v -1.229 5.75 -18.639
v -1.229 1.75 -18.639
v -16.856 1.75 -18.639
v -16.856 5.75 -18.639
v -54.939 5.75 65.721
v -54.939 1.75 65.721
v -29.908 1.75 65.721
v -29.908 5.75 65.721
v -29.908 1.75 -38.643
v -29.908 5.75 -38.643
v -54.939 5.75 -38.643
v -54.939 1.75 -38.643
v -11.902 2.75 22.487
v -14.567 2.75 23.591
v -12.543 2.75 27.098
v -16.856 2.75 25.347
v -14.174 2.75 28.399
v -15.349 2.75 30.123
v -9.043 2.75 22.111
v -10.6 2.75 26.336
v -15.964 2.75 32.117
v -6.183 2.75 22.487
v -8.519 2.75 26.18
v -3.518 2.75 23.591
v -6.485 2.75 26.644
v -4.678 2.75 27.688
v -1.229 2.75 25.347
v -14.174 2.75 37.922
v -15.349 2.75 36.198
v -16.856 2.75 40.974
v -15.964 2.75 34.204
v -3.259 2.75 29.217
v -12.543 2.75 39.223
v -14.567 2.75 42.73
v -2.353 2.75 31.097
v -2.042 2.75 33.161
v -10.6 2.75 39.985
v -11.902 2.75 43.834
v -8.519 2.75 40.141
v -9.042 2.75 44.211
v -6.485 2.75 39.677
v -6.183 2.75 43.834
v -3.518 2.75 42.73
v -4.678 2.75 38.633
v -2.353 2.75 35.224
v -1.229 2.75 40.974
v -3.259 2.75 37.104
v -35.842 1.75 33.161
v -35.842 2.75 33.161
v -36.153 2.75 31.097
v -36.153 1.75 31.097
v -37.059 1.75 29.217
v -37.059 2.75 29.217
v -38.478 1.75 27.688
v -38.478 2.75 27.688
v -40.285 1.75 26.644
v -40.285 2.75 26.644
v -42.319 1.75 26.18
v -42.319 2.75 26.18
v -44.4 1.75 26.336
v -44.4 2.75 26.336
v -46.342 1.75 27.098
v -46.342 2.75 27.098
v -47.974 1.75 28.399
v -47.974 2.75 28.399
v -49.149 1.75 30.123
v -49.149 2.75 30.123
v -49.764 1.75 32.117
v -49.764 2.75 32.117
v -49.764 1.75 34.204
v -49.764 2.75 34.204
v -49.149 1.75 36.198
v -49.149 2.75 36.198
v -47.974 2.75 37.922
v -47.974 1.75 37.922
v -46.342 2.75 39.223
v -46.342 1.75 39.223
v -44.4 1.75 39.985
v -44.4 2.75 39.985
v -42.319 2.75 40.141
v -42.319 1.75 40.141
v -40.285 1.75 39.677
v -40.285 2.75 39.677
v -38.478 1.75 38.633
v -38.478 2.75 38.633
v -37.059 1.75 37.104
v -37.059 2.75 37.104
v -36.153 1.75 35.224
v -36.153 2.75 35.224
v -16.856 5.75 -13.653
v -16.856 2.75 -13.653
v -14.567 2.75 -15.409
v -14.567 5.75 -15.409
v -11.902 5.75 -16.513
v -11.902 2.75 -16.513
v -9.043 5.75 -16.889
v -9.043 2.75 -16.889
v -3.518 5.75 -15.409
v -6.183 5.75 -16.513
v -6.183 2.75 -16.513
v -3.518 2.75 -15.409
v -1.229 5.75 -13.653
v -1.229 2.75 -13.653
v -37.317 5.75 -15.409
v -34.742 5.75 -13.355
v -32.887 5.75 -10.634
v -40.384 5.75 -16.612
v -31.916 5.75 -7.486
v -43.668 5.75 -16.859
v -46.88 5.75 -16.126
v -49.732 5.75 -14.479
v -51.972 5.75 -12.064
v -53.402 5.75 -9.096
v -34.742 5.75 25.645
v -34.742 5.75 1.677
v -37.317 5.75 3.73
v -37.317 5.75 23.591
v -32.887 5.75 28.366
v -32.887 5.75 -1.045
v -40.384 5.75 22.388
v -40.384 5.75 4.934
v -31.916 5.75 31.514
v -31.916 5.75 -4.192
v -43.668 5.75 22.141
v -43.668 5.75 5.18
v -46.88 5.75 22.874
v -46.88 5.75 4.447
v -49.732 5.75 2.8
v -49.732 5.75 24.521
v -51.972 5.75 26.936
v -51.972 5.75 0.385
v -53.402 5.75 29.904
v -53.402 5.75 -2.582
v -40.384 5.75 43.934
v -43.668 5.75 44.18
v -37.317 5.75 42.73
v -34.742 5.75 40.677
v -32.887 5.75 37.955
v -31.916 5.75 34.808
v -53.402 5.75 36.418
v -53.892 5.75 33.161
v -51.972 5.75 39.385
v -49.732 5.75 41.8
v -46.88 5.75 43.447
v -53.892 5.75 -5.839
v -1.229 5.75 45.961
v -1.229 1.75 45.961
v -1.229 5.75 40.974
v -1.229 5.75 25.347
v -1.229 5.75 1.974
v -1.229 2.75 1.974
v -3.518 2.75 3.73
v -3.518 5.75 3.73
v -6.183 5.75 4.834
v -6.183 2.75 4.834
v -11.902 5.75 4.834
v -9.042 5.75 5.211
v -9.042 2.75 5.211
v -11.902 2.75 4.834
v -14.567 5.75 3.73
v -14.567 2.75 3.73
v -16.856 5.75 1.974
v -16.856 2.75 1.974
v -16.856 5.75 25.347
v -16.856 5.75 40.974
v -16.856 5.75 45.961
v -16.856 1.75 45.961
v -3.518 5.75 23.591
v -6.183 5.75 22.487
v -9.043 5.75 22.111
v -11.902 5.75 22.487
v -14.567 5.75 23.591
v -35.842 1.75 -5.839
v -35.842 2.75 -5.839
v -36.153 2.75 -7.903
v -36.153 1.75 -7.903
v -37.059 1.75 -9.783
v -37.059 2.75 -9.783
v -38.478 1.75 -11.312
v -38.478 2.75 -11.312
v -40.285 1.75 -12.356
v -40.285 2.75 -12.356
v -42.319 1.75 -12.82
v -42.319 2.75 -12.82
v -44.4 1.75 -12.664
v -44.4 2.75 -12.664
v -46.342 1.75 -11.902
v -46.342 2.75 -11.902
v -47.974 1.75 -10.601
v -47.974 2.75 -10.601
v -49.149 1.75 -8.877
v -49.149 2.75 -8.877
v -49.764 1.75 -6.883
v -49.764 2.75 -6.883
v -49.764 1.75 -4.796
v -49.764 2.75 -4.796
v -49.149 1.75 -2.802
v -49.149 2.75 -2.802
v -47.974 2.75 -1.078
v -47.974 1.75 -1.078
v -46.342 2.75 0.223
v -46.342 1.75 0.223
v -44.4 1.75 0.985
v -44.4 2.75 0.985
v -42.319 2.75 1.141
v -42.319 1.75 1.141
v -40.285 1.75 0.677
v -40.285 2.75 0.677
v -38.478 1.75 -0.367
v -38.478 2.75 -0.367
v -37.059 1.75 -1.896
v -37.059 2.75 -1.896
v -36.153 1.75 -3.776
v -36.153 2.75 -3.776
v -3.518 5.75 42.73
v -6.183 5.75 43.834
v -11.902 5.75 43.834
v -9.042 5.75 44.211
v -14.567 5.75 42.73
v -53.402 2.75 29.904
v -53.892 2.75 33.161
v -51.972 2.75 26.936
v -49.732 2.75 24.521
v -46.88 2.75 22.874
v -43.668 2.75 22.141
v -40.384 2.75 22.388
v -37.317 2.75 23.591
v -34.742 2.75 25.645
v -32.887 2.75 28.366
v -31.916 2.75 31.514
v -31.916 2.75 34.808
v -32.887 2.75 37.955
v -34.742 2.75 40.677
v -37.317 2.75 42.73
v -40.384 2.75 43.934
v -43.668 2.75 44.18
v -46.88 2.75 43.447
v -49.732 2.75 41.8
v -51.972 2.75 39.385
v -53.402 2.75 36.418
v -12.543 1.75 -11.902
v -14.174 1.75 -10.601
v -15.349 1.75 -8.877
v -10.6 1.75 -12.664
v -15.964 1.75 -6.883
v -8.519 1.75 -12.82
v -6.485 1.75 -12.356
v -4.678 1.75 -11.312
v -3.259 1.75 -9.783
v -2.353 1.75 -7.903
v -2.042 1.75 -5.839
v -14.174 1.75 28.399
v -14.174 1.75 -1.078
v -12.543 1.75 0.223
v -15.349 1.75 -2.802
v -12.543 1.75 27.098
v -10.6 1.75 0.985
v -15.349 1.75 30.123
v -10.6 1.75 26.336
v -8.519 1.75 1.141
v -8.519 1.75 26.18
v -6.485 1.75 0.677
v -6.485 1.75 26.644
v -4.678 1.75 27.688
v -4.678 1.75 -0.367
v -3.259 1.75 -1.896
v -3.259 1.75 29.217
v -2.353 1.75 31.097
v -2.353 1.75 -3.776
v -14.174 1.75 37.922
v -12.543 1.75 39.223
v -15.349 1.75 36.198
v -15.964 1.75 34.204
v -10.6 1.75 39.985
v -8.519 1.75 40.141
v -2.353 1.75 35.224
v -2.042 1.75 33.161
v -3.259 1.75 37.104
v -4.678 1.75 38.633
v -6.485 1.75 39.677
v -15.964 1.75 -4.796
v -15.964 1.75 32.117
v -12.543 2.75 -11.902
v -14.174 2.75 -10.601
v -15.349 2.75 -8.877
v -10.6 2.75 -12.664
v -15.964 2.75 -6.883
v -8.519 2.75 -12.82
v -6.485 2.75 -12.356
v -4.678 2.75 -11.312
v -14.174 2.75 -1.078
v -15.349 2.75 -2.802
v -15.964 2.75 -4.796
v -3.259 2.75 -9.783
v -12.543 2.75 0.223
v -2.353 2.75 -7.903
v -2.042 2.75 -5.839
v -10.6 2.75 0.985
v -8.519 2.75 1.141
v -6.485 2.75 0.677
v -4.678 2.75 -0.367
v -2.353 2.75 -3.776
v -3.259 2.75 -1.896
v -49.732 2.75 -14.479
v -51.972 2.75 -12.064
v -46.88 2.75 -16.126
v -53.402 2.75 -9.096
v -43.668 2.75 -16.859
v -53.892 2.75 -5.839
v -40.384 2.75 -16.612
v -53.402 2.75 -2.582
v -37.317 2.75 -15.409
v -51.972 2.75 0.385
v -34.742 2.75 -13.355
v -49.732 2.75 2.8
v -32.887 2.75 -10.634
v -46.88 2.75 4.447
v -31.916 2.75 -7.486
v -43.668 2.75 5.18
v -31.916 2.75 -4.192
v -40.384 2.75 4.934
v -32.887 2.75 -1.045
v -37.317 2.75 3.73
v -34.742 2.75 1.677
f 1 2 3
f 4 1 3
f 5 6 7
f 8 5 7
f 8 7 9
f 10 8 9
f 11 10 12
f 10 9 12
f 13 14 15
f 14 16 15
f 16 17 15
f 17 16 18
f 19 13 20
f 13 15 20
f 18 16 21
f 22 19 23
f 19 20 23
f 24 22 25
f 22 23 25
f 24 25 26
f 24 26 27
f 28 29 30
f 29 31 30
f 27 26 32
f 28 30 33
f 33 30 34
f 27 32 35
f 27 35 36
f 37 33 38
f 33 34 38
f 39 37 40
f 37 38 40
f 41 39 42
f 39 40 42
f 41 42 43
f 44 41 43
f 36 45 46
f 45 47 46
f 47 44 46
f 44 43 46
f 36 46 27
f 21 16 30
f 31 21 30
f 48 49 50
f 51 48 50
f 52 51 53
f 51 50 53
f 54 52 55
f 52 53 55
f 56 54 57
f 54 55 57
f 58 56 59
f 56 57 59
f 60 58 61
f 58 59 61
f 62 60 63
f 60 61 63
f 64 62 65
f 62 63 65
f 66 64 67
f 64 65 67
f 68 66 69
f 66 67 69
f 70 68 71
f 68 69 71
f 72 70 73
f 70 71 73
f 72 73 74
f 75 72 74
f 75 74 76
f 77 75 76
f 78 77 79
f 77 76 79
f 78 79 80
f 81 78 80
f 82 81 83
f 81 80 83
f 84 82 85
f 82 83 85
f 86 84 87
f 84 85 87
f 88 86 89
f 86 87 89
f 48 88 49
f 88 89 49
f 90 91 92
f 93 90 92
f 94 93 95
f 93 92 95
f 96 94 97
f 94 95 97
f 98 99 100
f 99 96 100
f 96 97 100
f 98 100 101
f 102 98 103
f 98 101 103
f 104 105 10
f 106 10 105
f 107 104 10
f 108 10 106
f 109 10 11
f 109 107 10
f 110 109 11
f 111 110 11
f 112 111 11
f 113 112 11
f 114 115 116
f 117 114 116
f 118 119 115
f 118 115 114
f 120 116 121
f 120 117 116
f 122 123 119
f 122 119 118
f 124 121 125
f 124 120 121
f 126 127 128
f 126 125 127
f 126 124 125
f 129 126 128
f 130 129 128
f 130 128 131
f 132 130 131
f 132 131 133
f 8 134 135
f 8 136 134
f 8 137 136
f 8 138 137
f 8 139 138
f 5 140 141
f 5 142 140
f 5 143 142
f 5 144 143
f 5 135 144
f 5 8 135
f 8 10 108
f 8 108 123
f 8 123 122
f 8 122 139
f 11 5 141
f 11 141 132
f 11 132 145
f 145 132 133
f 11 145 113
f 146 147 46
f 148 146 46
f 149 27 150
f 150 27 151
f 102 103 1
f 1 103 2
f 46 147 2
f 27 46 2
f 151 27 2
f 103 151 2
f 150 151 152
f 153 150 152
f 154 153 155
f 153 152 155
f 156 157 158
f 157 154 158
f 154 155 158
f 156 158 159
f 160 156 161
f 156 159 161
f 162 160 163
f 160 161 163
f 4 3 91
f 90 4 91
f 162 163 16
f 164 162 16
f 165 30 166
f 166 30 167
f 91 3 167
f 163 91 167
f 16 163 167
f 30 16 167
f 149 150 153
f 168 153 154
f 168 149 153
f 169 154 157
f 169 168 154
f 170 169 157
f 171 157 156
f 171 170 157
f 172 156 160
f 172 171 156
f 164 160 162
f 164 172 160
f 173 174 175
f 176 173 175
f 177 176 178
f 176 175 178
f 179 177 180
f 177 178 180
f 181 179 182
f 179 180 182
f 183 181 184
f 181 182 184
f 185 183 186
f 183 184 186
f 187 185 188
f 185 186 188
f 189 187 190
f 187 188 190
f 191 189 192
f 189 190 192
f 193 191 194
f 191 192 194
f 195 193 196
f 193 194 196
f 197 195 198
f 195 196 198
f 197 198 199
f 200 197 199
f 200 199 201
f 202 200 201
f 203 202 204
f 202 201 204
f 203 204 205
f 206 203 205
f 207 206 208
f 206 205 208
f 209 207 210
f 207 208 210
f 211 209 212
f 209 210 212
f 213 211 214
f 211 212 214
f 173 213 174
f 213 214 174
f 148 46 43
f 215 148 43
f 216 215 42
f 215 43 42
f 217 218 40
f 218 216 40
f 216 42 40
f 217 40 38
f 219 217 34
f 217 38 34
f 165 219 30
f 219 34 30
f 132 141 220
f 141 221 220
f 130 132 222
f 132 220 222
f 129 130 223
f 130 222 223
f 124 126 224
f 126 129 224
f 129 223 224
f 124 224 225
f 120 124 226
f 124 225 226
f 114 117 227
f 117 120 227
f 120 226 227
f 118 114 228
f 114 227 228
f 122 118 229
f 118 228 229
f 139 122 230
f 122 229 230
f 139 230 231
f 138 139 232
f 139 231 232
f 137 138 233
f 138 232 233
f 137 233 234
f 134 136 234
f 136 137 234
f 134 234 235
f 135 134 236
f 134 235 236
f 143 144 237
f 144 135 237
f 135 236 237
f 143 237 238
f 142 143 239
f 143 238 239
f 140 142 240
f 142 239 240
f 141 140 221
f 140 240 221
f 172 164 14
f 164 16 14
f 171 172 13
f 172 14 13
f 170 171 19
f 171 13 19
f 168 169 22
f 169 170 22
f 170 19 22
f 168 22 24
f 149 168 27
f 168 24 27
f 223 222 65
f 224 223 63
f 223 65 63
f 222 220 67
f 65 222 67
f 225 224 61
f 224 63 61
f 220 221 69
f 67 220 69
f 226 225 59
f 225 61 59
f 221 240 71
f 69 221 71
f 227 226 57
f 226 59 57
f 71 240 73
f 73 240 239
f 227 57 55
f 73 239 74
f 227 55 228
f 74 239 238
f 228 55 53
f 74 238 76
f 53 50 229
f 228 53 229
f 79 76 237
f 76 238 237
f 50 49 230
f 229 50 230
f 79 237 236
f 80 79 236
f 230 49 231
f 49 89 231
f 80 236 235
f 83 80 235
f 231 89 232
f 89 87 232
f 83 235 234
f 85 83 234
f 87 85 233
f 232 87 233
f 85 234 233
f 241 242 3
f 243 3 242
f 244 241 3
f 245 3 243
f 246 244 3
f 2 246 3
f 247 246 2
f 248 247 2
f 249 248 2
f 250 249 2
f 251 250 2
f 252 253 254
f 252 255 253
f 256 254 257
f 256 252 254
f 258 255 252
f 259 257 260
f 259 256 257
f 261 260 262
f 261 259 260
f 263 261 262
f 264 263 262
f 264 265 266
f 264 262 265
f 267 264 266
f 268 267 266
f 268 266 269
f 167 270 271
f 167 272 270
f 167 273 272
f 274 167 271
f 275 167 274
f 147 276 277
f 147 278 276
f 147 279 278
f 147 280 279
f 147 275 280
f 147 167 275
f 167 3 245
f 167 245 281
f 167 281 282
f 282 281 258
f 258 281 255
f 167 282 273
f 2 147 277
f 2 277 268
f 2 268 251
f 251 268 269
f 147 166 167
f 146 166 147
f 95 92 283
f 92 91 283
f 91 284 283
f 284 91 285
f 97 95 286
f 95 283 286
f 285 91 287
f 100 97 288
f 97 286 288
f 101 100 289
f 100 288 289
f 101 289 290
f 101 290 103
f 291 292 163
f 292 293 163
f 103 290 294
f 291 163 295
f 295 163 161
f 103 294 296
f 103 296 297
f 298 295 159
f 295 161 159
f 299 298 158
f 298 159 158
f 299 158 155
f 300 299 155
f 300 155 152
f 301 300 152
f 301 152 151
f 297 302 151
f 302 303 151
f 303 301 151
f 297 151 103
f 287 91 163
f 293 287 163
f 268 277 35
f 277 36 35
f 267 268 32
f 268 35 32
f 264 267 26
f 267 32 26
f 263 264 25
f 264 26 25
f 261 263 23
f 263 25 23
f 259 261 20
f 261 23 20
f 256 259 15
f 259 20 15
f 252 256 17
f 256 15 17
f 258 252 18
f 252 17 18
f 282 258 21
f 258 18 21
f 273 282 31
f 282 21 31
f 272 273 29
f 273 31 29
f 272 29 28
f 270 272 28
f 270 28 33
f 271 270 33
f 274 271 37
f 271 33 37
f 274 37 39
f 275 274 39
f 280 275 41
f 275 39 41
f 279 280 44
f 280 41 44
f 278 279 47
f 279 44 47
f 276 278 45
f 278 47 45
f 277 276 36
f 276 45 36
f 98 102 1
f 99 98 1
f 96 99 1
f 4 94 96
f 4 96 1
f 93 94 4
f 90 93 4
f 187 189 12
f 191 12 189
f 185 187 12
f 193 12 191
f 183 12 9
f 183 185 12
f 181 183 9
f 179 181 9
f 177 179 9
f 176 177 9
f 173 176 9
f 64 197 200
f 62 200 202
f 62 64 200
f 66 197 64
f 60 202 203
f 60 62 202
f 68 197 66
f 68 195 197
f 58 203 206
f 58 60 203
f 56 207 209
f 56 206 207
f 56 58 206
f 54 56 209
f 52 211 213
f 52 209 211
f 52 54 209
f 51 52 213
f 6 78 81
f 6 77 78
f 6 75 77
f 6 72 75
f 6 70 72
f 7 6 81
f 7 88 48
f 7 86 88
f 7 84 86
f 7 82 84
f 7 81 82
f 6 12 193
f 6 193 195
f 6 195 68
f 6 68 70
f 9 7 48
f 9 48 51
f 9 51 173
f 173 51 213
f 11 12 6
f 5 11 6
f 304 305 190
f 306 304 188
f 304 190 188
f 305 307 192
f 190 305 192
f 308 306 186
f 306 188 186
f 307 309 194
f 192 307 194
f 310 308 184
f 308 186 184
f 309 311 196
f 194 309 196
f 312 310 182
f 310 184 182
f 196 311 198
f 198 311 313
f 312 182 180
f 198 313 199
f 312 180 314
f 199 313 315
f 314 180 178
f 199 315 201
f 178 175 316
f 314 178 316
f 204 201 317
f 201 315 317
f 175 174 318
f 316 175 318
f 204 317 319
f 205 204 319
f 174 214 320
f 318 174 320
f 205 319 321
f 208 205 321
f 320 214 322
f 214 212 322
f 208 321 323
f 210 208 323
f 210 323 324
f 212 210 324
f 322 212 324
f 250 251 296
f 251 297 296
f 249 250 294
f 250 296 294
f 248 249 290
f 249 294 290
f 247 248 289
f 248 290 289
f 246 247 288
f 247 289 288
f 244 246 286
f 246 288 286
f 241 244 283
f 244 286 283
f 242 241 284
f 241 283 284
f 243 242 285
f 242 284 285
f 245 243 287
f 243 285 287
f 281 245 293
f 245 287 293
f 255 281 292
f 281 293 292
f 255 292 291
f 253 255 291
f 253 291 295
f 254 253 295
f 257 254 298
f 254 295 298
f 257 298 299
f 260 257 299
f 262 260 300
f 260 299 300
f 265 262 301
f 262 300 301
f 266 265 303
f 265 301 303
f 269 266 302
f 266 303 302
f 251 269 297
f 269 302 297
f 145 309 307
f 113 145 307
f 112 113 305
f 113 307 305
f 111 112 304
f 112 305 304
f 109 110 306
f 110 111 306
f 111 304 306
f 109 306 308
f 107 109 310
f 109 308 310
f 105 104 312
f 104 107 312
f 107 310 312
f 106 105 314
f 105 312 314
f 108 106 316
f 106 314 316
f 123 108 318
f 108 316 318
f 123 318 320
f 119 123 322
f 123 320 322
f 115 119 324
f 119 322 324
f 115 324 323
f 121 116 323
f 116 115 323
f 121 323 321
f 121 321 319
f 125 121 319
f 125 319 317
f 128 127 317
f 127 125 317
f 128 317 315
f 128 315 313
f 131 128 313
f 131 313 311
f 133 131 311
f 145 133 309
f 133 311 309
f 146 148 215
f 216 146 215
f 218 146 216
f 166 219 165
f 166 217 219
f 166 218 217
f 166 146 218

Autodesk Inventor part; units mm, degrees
ref_plane "YZ Plane" through (0, 0, 0) normal (1, 0, 0) x (0, 1, 0)
ref_plane "XZ Plane" through (0, 0, 0) normal (0, 1, 0) x (-1, 0, 0)
ref_plane "Main Work Pane" through (0, 2.75, 7) normal (0, 1, 0) x (-1, 0, 0)
sketch "Panel" plane through (0, 2.75, 7) normal (0, 1, 0) x (-1, 0, 0)
  circle A0 centre (9.0425, 26.1606) radius 11.05 construction
  circle A1 centre (9.0425, -12.8394) radius 11.05 construction
  circle A2 centre (42.8425, -12.8394) radius 11.05
  circle A3 centre (42.8425, 26.1606) radius 11.05
  line L0 (42.8425, -12.8394) -> (42.8425, -12.8394) construction
  line L1 (60.8425, 44.1606) -> (24.8425, 44.1606) construction
  line L2 (24.8425, 44.1606) -> (24.8425, 8.1606) construction
  line L3 (24.8425, 8.1606) -> (60.8425, 8.1606) construction
  line L4 (60.8425, 8.1606) -> (60.8425, 44.1606) construction
  line L5 (60.8425, 44.1606) -> (24.8425, 8.1606) construction
  line L6 (24.8425, 44.1606) -> (60.8425, 8.1606) construction
  line L7 (60.8425, 5.1606) -> (24.8425, 5.1606) construction
  line L8 (24.8425, 5.1606) -> (24.8425, -30.8394) construction
  line L9 (24.8425, -30.8394) -> (60.8425, -30.8394) construction
  line L10 (60.8425, -30.8394) -> (60.8425, 5.1606) construction
  line L11 (60.8425, 5.1606) -> (24.8425, -30.8394) construction
  line L12 (24.8425, 5.1606) -> (60.8425, -30.8394) construction
  line L13 (21.8425, 38.9606) -> (-3.7575, 38.9606) construction
  line L14 (-3.7575, 38.9606) -> (-3.7575, 13.3606) construction
  line L15 (-3.7575, 13.3606) -> (21.8425, 13.3606) construction
  line L16 (21.8425, 13.3606) -> (21.8425, 38.9606) construction
  line L17 (21.8425, 38.9606) -> (-3.7575, 13.3606) construction
  line L18 (-3.7575, 38.9606) -> (21.8425, 13.3606) construction
  line L19 (21.8425, -0.0394) -> (-3.7575, -0.0394) construction
  line L20 (-3.7575, -0.0394) -> (-3.7575, -25.6394) construction
  line L21 (-3.7575, -25.6394) -> (21.8425, -25.6394) construction
  line L22 (21.8425, -25.6394) -> (21.8425, -0.0394) construction
  line L23 (21.8425, -0.0394) -> (-3.7575, -25.6394) construction
  line L24 (-3.7575, -0.0394) -> (21.8425, -25.6394) construction
  line L25 (60.8425, -30.8394) -> (60.8425, 44.1606) construction
  line L26 (60.8425, 44.1606) -> (-3.7575, 44.1606) construction
  line L27 (-3.7575, 44.1606) -> (-3.7575, -30.8394) construction
  line L28 (-3.7575, -30.8394) -> (60.8425, -30.8394) construction
  line L29 (91.5425, -93.8394) -> (-34.4575, -93.8394) construction
  line L30 (-34.4575, -93.8394) -> (-34.4575, 107.1606) construction
  line L31 (-34.4575, 107.1606) -> (91.5425, 107.1606) construction
  line L32 (91.5425, 107.1606) -> (91.5425, -93.8394) construction
  line L33 (42.8425, 15.1106) -> (42.8425, -1.7894) construction
  line L34 (31.7925, 26.1606) -> (20.0925, 26.1606) construction
  line L35 (9.0425, 15.1106) -> (9.0425, -1.7894) construction
  line L36 (20.0925, -12.8394) -> (31.7925, -12.8394) construction
  line L37 (17.4252, 107.1606) -> (17.4252, 44.1606) construction
  line L38 (17.4252, -30.8394) -> (17.4252, -93.8394) construction
  line L39 (60.8425, 6.6606) -> (91.5425, 6.6606) construction
  line L40 (-3.7575, 6.6606) -> (-34.4575, 6.6606) construction
  line L41 (71.3425, 84.9606) -> (89.5425, 84.9606) construction
  line L42 (89.5425, 84.9606) -> (89.5425, 105.1606) construction
  line L43 (89.5425, 105.1606) -> (71.3425, 105.1606) construction
  line L44 (71.3425, 105.1606) -> (71.3425, 84.9606) construction
  line L45 (69.3425, 107.1606) -> (69.3425, 82.9606) construction
  line L46 (69.3425, 82.9606) -> (91.5425, 82.9606) construction
  line L47 (89.5425, -91.8394) -> (71.3425, -91.8394) construction
  line L48 (71.3425, -91.8394) -> (71.3425, -71.6394) construction
  line L49 (71.3425, -71.6394) -> (89.5425, -71.6394) construction
  line L50 (89.5425, -71.6394) -> (89.5425, -91.8394) construction
  line L51 (91.5425, -69.6394) -> (69.3425, -69.6394) construction
  line L52 (69.3425, -69.6394) -> (69.3425, -93.8394) construction
  line L53 (-32.4575, -91.8394) -> (-14.2575, -91.8394) construction
  line L54 (-14.2575, -91.8394) -> (-14.2575, -71.6394) construction
  line L55 (-14.2575, -71.6394) -> (-32.4575, -71.6394) construction
  line L56 (-32.4575, -71.6394) -> (-32.4575, -91.8394) construction
  line L57 (-12.2575, -93.8394) -> (-12.2575, -69.6394) construction
  line L58 (-12.2575, -69.6394) -> (-34.4575, -69.6394) construction
  line L59 (-14.2575, 84.9606) -> (-32.4575, 84.9606) construction
  line L60 (-32.4575, 84.9606) -> (-32.4575, 105.1606) construction
  line L61 (-32.4575, 105.1606) -> (-14.2575, 105.1606) construction
  line L62 (-14.2575, 105.1606) -> (-14.2575, 84.9606) construction
  line L63 (-12.2575, 107.1606) -> (-12.2575, 82.9606) construction
  line L64 (-12.2575, 82.9606) -> (-34.4575, 82.9606) construction
  circle A4 centre (80.4425, 95.0606) radius 2 construction
  line L65 (80.4425, 95.0606) -> (71.3425, 95.0606) construction
  line L66 (80.4425, 95.0606) -> (89.5425, 95.0606) construction
  line L67 (80.4425, 95.0606) -> (80.4425, 105.1606) construction
  line L68 (80.4425, 95.0606) -> (80.4425, 84.9606) construction
  circle A5 centre (-23.3575, 95.0606) radius 2 construction
  line L69 (-23.3575, 95.0606) -> (-23.3575, 84.9606) construction
  line L70 (-23.3575, 95.0606) -> (-23.3575, 105.1606) construction
  line L71 (-23.3575, 95.0606) -> (-32.4575, 95.0606) construction
  line L72 (-23.3575, 95.0606) -> (-14.2575, 95.0606) construction
  circle A6 centre (80.4425, -81.7394) radius 2 construction
  line L73 (80.4425, -81.7394) -> (80.4425, -71.6394) construction
  line L74 (80.4425, -71.6394) -> (80.4425, -81.7394) construction
  line L75 (80.4425, -91.8394) -> (80.4425, -81.7394) construction
  line L76 (80.4425, -81.7394) -> (71.3425, -81.7394) construction
  line L77 (80.4425, -81.7394) -> (89.5425, -81.7394) construction
  circle A7 centre (-23.3575, -81.7394) radius 2 construction
  line L78 (-23.3575, -81.7394) -> (-23.3575, -91.8394) construction
  line L79 (-23.3575, -81.7394) -> (-14.2575, -81.7394) construction
  line L80 (-23.3575, -81.7394) -> (-32.4575, -81.7394) construction
  line L81 (-23.3575, -81.7394) -> (-23.3575, -71.6394) construction
  line L82 (54.9391, 58.7211) -> (29.9084, 58.7211)
  line L83 (29.9084, 58.7211) -> (29.9084, -45.6432)
  line L84 (29.9084, -45.6432) -> (54.9391, -45.6432)
  line L85 (54.9391, -45.6432) -> (54.9391, 58.7211)
  arc A8 (1.229, -20.653) -> (16.856, -20.653) centre (9.0425, -12.8394) ccw
  arc A9 (16.856, -5.0259) -> (1.229, -5.0259) centre (9.0425, -12.8394) ccw
  arc A10 (1.229, 18.347) -> (16.856, 18.347) centre (9.0425, 26.1606) ccw
  arc A11 (16.856, 33.9741) -> (1.229, 33.9741) centre (9.0425, 26.1606) ccw
  line L86 (16.856, -20.653) -> (16.856, -5.0259)
  line L87 (16.856, -5.0259) -> (16.856, 18.347)
  line L88 (16.856, 18.347) -> (16.856, 33.9741)
  line L89 (1.229, 33.9741) -> (1.229, 18.347)
  line L90 (1.229, 18.347) -> (1.229, -5.0259)
  line L91 (1.229, -5.0259) -> (1.229, -20.653)
  line L92 (1.229, -20.653) -> (1.229, -25.6394)
  line L93 (1.229, -25.6394) -> (16.856, -25.6394)
  line L94 (16.856, -25.6394) -> (16.856, -20.653)
  line L95 (16.856, 33.9741) -> (16.856, 38.9606)
  line L96 (16.856, 38.9606) -> (1.229, 38.9606)
  line L97 (1.229, 38.9606) -> (1.229, 33.9741)
  dimension "d337" = 22.1
  dimension "d490" = 36
  dimension "d491" = 36
  dimension "d494" = 3
  dimension "d495" = 25.6
  dimension "d496" = 25.6
  dimension "d497" = 3
  dimension "d498" = 0
  dimension "d582" = 126
  dimension "d583" = 201
  dimension "d584" = 2
  dimension "d585" = 2
  dimension "d586" = 2
  dimension "d587" = 2
  dimension "d588" = 20.2
  dimension "d589" = 18.2
  dimension "d592" = 2
  dimension "d593" = 4
  dimension "d597" = 2
  dimension "d648" = 2
  dimension "d651" = 152.6
ref_plane "Work Plane13" through (0, 2.75, 7) normal (0, -1, 0) x (1, 0, 0)
ref_plane "Work Plane11" through (0, 2.75, 7) normal (0, -1, 0) x (1, 0, 0)
ref_plane "Work Plane12" through (0, 4.75, 7) normal (0, 1, 0) x (1, 0, 0)
extrude "FlatPlane" add sketch "Panel" along normal blind 3 contours L85 L84 L83 L82 | A8 L94 L93 L92 | L90 A10 L87 A9 | L97 L96 L95 A11
sketch "Sketch21" plane through (0, 2.75, 7) normal (0, -1, 0) x (1, 0, 0)
  circle A0 centre (-42.8425, 26.1606) radius 11.05 projected
  circle A1 centre (-42.8425, 26.1606) radius 7
  circle A2 centre (-42.8425, -12.8394) radius 11.05 projected
  circle A3 centre (-42.8425, -12.8394) radius 7
  arc A4 (-1.229, 33.9741) -> (-16.856, 33.9741) centre (-9.0425, 26.1606) ccw projected
  circle A5 centre (-9.0425, 26.1606) radius 7
  arc A6 (-16.856, -20.653) -> (-1.229, -20.653) centre (-9.0425, -12.8394) ccw projected
  circle A7 centre (-9.0425, -12.8394) radius 7
  line L0 (-54.9391, 58.7211) -> (-29.9084, 58.7211)
  line L1 (-29.9084, 58.7211) -> (-29.9084, -45.6432)
  line L2 (-29.9084, -45.6432) -> (-54.9391, -45.6432)
  line L3 (-54.9391, -45.6432) -> (-54.9391, 58.7211)
  line L4 (-16.856, 38.9606) -> (-1.229, 38.9606)
  line L5 (-1.229, 38.9606) -> (-1.229, -25.6394)
  line L6 (-1.229, -25.6394) -> (-16.856, -25.6394)
  line L7 (-16.856, -25.6394) -> (-16.856, 38.9606)
  point P0 (0, -7)
  dimension "d656" = 14
extrude "Extrusion18" add sketch "Sketch21" along normal blind 1 contours A0 | A2 | L5 A6 L7 A4 | A4 L7 L4 L5 | L5 L6 L7 A6 | L0 L1 L2 L3
properties part number "FilterHolder" material "NylonD2W"
